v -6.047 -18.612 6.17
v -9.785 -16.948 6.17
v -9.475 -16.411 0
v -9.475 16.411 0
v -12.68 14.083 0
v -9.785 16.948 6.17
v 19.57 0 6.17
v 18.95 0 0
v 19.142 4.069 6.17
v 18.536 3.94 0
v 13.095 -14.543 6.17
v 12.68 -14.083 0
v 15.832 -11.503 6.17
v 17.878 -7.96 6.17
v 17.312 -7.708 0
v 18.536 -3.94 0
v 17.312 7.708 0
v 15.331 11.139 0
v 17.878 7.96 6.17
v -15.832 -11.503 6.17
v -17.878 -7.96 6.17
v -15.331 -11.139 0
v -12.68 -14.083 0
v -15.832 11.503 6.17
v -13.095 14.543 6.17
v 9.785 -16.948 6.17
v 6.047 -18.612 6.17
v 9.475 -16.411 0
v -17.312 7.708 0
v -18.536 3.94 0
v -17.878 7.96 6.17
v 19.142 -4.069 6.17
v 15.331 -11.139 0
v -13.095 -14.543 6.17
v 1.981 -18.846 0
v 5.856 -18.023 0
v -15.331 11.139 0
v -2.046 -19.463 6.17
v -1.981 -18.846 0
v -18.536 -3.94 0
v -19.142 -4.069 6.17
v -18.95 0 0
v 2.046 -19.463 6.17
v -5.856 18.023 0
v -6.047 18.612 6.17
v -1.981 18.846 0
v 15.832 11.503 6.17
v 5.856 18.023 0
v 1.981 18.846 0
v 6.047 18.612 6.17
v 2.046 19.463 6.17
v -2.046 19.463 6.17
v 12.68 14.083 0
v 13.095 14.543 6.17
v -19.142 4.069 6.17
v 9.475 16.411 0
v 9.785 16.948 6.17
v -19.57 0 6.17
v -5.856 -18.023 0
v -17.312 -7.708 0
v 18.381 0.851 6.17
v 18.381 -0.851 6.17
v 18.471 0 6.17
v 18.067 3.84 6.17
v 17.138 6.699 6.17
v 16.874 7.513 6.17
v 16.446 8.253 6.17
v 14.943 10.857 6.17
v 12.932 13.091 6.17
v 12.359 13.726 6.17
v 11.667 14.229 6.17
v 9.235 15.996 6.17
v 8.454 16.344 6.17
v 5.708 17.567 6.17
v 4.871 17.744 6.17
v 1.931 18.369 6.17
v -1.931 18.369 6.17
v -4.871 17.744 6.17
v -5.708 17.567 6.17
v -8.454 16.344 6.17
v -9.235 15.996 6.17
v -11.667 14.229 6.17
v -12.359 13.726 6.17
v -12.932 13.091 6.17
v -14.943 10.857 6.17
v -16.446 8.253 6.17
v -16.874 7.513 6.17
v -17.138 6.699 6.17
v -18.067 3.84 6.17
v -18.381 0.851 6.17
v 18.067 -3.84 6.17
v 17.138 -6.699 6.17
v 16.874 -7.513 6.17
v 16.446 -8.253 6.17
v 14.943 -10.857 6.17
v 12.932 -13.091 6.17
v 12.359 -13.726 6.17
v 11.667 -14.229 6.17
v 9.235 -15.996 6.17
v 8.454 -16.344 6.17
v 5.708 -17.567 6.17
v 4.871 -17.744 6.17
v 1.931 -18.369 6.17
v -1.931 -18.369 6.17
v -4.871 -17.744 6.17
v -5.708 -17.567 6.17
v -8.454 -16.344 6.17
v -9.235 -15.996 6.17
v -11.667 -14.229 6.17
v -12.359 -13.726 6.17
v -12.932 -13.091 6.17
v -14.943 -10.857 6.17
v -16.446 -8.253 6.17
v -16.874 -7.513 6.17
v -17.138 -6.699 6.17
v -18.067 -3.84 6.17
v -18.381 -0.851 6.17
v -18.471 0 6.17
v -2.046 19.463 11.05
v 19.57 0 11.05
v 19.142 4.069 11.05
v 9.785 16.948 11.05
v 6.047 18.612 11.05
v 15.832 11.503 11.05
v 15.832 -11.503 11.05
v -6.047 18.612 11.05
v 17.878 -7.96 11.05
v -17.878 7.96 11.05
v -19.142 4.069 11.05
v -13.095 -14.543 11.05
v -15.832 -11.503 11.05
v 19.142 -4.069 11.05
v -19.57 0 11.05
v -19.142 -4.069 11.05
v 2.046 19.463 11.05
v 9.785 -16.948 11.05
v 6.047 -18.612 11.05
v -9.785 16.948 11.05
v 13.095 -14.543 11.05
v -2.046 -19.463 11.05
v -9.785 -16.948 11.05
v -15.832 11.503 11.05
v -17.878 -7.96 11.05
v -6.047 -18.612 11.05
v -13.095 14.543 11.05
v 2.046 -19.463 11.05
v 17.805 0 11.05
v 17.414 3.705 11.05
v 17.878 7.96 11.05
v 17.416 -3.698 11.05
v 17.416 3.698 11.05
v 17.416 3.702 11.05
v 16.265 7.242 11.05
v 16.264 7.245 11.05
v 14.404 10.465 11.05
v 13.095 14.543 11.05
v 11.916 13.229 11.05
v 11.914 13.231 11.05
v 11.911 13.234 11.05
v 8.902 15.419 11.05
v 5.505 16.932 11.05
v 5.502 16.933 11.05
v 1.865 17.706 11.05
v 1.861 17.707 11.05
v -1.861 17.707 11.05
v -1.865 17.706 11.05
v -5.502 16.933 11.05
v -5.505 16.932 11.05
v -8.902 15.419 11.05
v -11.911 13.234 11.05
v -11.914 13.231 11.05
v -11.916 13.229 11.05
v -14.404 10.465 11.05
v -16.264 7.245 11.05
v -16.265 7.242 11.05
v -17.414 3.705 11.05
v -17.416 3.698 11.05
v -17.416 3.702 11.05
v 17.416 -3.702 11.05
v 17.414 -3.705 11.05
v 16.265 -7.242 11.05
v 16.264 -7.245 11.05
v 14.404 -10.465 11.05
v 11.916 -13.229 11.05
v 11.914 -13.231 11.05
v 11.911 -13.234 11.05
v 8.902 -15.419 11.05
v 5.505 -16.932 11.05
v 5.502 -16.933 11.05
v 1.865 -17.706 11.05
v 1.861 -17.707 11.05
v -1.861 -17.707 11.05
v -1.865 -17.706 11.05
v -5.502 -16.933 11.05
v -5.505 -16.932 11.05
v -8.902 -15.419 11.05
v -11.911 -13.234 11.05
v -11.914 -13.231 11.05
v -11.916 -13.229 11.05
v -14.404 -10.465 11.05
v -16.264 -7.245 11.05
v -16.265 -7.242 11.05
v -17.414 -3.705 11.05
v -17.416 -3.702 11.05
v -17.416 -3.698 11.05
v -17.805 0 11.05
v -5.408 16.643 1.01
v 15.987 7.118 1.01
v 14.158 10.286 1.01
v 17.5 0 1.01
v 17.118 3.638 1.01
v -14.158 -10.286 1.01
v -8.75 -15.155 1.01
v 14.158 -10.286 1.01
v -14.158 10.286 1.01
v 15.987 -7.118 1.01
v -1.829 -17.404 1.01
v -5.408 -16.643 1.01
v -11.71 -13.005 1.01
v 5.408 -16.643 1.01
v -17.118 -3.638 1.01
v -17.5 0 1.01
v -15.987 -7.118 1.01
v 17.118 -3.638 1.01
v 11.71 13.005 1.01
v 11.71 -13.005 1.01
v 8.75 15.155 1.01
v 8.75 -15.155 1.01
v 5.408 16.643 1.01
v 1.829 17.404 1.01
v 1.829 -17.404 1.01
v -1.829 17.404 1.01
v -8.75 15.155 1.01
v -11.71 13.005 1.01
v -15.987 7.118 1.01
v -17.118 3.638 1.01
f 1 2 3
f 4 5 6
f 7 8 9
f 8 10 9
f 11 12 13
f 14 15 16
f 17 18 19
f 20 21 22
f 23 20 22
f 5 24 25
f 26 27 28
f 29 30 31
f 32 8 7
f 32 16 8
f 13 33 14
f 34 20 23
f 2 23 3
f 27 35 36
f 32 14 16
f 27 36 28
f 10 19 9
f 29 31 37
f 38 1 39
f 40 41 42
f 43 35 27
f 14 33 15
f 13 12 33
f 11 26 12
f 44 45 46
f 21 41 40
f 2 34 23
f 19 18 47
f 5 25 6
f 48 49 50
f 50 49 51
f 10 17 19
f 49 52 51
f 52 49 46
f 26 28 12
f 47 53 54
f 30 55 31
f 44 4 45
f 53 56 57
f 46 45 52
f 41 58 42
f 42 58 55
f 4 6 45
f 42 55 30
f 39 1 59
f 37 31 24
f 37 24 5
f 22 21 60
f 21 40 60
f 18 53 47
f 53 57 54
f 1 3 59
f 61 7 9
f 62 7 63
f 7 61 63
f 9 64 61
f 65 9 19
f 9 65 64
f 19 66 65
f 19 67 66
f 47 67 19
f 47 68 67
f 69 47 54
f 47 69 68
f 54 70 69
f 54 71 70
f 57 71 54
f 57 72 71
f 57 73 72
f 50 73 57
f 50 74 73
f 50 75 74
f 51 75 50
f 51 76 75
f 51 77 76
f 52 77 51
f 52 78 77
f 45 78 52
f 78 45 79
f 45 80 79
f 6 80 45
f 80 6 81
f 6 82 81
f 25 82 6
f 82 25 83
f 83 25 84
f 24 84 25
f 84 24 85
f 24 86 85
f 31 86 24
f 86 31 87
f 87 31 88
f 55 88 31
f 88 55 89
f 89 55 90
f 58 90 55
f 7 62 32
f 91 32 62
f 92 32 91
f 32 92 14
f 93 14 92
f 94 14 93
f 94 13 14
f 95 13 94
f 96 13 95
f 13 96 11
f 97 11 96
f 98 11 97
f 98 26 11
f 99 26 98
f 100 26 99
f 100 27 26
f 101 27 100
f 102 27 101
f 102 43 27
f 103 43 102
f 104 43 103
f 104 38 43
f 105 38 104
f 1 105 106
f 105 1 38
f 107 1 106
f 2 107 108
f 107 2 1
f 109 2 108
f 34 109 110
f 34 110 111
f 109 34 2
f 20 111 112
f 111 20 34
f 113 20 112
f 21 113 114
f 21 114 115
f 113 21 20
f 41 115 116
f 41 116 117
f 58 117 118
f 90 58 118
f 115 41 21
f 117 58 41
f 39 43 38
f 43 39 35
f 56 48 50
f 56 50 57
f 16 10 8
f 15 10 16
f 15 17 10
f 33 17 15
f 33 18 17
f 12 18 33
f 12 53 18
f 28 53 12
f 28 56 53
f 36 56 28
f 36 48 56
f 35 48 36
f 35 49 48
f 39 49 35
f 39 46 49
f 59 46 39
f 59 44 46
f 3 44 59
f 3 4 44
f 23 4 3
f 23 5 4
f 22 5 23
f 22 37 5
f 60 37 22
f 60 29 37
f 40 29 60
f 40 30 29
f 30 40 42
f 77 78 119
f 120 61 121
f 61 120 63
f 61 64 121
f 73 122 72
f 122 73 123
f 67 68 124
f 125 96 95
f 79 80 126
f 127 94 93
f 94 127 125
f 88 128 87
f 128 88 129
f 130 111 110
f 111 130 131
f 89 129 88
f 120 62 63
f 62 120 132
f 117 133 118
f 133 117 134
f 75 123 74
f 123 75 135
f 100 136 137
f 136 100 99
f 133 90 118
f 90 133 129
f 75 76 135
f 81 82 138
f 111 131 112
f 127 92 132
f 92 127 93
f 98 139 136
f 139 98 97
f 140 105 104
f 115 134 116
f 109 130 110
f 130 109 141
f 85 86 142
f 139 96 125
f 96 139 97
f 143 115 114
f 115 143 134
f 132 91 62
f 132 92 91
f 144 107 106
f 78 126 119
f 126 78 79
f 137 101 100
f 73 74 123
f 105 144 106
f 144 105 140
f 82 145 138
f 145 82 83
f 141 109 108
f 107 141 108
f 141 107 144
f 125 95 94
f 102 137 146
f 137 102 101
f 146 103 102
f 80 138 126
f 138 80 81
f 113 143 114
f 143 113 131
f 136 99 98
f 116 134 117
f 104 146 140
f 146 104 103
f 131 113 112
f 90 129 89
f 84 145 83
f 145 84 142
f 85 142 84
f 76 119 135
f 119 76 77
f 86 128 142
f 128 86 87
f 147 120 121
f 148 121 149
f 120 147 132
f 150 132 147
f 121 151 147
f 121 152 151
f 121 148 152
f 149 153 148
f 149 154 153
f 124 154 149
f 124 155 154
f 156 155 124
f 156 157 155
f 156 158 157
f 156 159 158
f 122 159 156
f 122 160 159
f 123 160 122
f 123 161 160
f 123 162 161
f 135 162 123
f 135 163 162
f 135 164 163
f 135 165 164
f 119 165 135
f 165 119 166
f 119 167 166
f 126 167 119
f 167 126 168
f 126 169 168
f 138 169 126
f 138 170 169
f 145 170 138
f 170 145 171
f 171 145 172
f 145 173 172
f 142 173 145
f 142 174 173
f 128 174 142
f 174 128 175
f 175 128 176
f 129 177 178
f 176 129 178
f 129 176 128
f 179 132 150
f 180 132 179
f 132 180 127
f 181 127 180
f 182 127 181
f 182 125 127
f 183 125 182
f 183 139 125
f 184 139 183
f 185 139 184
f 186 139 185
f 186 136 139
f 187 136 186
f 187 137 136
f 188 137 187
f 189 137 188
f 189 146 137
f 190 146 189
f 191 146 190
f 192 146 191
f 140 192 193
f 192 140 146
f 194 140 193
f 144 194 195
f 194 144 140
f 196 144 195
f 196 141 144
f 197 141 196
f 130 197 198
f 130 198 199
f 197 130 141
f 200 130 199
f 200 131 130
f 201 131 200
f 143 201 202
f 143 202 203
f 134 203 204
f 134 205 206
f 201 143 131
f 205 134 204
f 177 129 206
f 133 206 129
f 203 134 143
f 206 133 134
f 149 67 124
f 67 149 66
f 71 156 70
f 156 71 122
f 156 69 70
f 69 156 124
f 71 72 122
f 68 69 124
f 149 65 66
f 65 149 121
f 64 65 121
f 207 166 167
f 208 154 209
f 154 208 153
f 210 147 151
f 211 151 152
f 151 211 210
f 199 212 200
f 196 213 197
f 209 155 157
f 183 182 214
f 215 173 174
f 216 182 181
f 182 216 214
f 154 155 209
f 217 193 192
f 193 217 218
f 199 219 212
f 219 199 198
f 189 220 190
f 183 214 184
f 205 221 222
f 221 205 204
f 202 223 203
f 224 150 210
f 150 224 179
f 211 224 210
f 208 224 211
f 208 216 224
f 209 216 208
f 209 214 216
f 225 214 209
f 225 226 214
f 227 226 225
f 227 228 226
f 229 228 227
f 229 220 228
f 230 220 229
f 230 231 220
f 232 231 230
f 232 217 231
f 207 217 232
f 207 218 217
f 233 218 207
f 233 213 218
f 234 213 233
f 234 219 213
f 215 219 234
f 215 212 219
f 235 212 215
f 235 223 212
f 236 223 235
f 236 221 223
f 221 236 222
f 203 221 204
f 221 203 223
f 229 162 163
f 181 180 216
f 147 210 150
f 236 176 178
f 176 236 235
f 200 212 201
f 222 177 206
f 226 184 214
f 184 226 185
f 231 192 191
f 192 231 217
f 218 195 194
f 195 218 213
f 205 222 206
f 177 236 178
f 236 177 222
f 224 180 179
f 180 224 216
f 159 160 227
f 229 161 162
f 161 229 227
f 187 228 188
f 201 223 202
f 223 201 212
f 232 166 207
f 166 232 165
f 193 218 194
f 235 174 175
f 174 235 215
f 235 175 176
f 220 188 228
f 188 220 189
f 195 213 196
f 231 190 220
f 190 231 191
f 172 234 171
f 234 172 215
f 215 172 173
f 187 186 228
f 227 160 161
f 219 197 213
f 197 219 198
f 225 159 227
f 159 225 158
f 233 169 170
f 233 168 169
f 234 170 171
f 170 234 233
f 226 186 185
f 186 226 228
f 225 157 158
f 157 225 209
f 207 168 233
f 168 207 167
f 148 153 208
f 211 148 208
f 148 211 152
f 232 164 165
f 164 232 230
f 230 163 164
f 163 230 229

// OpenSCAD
sPD();


module sPD() {
   difference() {
      union() {
         cylinder(d1=37.90, d2=39.14, h=6.17, center=false);
         translate([0, 0, 11.05-6.17]) {cylinder(d1=37.13-0.77,d2=39.14, h=6.17, center=false);}
      }
      translate([0, 0, 1.01]) {cylinder(d1=35.00,d2=35.61, h=11.05-1.0, center=false);}
   }
}
